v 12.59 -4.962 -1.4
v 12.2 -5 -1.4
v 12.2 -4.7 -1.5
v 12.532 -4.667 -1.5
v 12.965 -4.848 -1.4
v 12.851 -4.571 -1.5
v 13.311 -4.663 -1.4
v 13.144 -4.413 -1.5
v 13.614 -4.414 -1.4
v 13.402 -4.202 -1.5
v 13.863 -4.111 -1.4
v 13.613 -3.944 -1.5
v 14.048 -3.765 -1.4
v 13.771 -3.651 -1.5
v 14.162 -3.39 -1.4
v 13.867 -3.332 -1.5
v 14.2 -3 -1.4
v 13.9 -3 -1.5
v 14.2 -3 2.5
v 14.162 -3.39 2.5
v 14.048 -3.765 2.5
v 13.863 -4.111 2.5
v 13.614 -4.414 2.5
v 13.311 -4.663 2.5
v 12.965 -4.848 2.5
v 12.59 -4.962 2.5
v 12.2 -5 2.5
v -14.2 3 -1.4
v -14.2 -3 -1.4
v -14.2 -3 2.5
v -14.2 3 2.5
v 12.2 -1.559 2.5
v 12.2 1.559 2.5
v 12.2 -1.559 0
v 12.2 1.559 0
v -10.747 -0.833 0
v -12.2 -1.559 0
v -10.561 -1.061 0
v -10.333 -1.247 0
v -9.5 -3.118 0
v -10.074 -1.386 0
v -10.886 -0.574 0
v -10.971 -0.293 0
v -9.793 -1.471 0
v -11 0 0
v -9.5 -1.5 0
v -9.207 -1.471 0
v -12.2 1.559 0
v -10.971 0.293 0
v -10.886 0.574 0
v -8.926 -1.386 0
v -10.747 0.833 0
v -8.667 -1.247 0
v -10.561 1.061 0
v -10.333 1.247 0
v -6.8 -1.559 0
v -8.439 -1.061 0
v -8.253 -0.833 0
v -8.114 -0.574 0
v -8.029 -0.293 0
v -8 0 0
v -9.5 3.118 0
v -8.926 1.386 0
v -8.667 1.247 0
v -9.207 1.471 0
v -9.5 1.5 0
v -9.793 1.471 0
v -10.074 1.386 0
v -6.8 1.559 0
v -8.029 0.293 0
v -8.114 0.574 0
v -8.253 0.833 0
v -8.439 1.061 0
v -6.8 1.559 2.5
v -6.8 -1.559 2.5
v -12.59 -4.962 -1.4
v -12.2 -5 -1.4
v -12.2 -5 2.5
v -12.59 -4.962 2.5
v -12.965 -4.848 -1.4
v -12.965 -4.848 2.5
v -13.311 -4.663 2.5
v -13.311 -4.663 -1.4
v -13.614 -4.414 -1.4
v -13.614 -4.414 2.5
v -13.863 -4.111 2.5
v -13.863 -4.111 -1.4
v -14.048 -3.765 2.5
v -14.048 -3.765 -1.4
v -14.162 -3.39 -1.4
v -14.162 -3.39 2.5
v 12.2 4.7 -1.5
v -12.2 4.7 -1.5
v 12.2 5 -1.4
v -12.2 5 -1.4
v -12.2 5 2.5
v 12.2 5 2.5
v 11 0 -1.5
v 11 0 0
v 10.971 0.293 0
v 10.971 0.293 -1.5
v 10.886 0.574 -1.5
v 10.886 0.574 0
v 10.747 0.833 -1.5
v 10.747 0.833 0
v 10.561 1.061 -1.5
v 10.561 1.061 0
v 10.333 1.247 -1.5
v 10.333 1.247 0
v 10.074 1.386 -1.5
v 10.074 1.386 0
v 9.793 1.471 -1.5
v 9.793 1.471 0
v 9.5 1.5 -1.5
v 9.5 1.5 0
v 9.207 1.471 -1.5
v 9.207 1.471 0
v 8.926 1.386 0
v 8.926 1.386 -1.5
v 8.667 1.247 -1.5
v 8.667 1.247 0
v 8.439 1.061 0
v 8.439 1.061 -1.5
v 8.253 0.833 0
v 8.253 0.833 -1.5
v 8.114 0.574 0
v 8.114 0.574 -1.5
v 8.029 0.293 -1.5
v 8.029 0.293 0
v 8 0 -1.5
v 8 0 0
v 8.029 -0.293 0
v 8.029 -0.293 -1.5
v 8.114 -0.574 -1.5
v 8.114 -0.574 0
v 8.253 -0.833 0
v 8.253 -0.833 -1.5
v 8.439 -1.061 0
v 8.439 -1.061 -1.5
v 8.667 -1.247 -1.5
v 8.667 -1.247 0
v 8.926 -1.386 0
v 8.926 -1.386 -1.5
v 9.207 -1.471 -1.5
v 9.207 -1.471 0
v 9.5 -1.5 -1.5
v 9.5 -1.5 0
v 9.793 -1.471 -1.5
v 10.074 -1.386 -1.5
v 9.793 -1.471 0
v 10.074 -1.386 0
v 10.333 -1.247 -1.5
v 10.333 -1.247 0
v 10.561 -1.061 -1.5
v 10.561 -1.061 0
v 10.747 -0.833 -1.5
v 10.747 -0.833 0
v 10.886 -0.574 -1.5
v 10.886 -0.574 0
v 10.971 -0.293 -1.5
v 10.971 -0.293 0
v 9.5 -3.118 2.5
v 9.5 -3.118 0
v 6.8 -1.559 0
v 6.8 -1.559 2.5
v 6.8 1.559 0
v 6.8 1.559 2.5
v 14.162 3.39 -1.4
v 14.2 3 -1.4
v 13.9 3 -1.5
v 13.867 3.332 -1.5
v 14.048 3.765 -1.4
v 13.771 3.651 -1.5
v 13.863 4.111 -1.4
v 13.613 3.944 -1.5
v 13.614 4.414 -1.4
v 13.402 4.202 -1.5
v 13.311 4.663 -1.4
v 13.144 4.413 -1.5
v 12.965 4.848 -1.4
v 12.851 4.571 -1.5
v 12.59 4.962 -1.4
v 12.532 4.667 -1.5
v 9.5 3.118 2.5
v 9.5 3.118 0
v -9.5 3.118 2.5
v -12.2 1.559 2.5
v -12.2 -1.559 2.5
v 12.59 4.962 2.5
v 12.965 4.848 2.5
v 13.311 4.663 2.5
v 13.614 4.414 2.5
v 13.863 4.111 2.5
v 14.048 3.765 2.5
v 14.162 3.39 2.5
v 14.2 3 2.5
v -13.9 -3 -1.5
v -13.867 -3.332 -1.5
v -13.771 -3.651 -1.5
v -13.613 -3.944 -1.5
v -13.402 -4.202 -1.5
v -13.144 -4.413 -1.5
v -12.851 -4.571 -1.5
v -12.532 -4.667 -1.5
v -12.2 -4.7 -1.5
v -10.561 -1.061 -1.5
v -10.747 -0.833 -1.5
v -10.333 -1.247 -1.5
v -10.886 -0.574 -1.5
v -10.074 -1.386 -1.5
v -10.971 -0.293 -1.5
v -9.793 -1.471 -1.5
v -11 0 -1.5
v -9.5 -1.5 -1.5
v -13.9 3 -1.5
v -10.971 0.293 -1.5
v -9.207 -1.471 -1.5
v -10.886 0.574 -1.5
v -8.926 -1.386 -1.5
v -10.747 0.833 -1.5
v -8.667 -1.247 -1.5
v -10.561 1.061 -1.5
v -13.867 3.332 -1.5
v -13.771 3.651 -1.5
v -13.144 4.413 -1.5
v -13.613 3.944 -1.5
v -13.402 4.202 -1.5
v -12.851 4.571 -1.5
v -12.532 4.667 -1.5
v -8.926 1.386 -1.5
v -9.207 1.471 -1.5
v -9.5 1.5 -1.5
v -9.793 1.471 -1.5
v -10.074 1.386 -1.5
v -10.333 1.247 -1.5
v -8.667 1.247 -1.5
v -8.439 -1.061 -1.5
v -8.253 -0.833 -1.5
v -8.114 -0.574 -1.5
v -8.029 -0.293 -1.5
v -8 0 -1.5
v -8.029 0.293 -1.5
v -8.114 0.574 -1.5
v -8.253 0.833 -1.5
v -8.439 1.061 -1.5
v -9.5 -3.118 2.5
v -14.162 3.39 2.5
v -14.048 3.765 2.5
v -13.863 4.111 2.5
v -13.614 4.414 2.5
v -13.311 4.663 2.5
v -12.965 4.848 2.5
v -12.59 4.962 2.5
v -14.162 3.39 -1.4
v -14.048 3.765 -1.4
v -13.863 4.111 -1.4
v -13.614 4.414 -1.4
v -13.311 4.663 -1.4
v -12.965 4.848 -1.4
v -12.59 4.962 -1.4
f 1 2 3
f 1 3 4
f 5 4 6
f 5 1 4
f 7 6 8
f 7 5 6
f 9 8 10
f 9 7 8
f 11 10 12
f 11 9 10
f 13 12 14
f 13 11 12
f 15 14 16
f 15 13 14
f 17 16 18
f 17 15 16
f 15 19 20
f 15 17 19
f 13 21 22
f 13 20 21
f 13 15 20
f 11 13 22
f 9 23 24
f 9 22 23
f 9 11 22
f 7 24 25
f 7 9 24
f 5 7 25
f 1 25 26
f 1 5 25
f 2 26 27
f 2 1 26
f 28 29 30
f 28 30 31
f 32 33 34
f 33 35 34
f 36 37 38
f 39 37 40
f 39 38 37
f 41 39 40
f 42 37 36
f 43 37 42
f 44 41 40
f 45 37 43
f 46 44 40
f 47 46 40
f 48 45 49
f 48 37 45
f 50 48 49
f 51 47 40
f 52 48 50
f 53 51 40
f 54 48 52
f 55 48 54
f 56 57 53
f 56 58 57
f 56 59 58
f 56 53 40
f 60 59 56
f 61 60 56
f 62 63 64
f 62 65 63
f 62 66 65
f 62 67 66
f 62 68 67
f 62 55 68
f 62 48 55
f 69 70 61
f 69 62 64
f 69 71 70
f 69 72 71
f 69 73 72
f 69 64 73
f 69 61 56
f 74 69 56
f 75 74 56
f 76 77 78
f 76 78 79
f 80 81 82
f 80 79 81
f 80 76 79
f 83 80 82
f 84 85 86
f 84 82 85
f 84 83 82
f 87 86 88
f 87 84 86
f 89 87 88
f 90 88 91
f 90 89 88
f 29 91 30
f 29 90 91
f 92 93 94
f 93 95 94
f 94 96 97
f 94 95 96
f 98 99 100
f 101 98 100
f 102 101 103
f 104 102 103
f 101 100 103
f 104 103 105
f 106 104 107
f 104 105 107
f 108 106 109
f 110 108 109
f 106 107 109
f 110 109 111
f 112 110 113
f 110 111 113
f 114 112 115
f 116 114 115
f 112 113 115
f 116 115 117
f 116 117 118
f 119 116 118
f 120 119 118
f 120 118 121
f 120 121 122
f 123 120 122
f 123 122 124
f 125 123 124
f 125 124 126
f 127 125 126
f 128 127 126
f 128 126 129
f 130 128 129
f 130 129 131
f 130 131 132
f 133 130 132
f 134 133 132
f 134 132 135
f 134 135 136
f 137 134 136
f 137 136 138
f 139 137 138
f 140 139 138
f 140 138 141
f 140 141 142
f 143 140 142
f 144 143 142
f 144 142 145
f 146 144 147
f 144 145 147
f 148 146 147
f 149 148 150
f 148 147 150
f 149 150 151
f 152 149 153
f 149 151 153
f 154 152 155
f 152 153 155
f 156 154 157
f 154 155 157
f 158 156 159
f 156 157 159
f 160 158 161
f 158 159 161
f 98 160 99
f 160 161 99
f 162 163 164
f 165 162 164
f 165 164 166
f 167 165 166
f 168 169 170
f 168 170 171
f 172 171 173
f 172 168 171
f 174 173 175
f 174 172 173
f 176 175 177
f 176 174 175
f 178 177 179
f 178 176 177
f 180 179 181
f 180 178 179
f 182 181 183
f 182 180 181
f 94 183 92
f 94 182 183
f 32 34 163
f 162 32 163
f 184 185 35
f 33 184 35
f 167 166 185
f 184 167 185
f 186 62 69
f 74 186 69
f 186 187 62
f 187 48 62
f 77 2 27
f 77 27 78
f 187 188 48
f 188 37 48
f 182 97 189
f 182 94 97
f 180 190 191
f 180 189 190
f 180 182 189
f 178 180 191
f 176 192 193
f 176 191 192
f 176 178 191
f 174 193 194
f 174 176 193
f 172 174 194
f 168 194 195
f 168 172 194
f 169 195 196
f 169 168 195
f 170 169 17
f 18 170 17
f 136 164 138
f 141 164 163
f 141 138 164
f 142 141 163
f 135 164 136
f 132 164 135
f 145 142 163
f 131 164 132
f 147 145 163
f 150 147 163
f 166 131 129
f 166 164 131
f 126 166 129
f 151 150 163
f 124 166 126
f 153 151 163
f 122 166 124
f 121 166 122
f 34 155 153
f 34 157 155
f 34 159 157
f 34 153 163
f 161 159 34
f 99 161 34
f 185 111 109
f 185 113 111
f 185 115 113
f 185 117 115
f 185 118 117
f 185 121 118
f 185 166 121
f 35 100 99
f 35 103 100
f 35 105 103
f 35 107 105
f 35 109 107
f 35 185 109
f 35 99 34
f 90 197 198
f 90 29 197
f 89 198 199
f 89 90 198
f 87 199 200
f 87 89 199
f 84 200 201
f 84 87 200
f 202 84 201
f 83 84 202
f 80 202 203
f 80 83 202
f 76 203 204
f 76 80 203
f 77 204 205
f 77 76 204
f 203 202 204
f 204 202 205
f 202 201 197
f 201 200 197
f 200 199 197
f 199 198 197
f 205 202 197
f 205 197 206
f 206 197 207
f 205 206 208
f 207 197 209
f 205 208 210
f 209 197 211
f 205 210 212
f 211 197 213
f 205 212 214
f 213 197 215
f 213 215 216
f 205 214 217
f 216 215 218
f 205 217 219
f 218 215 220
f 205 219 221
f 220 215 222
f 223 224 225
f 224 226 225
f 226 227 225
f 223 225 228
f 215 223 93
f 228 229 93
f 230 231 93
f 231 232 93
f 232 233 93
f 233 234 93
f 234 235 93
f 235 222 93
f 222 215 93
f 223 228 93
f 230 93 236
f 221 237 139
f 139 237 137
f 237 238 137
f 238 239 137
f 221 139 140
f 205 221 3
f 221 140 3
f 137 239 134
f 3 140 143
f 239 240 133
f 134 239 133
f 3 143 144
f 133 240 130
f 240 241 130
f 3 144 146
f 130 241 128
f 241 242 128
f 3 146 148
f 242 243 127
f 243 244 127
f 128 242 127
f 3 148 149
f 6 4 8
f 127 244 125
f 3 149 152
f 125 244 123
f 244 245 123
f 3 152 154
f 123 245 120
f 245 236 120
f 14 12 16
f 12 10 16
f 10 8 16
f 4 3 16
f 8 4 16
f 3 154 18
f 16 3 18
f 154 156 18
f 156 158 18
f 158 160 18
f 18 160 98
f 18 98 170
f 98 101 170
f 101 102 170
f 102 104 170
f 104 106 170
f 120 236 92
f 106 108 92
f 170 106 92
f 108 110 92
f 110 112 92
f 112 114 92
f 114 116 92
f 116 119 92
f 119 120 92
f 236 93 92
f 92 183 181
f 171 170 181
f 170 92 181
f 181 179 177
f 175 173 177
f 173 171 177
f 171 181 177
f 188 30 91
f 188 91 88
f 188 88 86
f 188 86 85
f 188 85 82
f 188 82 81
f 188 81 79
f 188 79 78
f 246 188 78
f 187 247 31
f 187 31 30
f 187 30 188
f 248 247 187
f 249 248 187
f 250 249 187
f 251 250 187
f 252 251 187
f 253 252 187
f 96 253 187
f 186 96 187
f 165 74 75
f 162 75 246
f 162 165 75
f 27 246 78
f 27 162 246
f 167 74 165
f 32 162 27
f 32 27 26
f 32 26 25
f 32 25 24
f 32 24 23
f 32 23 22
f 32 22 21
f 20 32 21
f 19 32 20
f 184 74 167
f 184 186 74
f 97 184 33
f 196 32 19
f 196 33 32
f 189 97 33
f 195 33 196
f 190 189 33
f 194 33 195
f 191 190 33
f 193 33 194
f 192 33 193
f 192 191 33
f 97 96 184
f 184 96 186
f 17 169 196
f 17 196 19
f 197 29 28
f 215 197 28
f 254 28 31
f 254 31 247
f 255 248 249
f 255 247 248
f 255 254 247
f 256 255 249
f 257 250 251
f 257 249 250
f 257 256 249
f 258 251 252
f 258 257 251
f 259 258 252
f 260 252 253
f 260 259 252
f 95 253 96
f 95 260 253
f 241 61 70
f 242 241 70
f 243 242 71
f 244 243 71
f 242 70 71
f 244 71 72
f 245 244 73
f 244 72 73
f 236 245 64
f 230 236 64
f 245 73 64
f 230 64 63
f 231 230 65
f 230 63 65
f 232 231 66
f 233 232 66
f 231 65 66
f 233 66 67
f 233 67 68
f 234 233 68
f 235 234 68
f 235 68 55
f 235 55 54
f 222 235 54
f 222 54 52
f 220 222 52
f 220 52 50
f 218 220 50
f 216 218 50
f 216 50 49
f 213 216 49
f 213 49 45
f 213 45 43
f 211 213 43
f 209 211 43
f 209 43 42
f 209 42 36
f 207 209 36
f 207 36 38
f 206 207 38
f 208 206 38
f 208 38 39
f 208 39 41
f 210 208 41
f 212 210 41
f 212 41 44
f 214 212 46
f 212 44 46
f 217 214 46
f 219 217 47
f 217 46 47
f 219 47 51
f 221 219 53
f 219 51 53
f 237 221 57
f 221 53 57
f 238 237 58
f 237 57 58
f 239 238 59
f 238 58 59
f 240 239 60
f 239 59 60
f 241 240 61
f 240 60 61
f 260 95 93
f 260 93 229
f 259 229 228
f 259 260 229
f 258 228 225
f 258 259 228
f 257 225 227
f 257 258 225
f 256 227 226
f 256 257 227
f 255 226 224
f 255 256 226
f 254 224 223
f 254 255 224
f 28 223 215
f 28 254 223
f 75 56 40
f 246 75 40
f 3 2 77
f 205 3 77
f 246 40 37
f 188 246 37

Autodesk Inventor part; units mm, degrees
ref_plane "YZ Plane" through (0, 0, 0) normal (1, 0, 0) x (0, 1, 0)
ref_plane "XZ Plane" through (0, 0, 0) normal (0, 1, 0) x (-1, 0, 0)
ref_plane "XY Plane" through (0, 0, 0) normal (0, 0, 1) x (1, 0, 0)
sketch "Эскиз1" plane through (0, 0, 0) normal (0, 0, 1) x (1, 0, 0)
  line L0 (-6.8, -1.5588) -> (-9.5, -3.1177)
  line L1 (-9.5, -3.1177) -> (-12.2, -1.5588)
  circle A0 centre (-9.5, 0) radius 1.5
  line L2 (-6.8, 1.5588) -> (-6.8, -1.5588)
  line L3 (-12.2, -1.5588) -> (-12.2, 1.5588)
  line L4 (-9.5, 3.1177) -> (-6.8, 1.5588)
  line L5 (-12.2, 1.5588) -> (-9.5, 3.1177)
  line L6 (6.8, -1.5588) -> (6.8, 1.5588)
  line L7 (6.8, 1.5588) -> (9.5, 3.1177)
  line L8 (9.5, -3.1177) -> (6.8, -1.5588)
  circle A1 centre (9.5, 0) radius 1.5
  line L9 (9.5, 3.1177) -> (12.2, 1.5588)
  line L10 (12.2, 1.5588) -> (12.2, -1.5588)
  line L11 (12.2, -1.5588) -> (9.5, -3.1177)
  line L12 (-12.2, 5) -> (12.2, 5)
  line L13 (14.2, 3) -> (14.2, -3)
  line L14 (12.2, -5) -> (-12.2, -5)
  line L15 (-14.2, -3) -> (-14.2, 3)
  arc A2 (-12.2, 5) -> (-14.2, 3) centre (-12.2, 3) ccw
  arc A3 (-14.2, -3) -> (-12.2, -5) centre (-12.2, -3) ccw
  arc A4 (12.2, -5) -> (14.2, -3) centre (12.2, -3) ccw
  arc A5 (14.2, 3) -> (12.2, 5) centre (12.2, 3) ccw
  line L16 (0, 0) -> (0, 2.3671) construction
  point P0 (14.2, 0)
  point P1 (-14.2, 0)
  point P2 (0, 5)
  dimension "Width" = 10
  dimension "d6" = 2
  dimension "d12" = 13.6
extrude "Выдавливание1" add sketch "Эскиз1" against normal blind 1.5 contours L0 L1 L3 L5 L4 L2 | L6 L7 L9 L10 L11 L8 | L12 A5 L13 A4 L14 A3 L15 A2
extrude "Выдавливание2" add sketch "Эскиз1" along normal blind 2.5 contours L12 A5 L13 A4 L14 A3 L15 A2
chamfer "Фаска1" distance 0.3 distance2 0.1 8 edges at (0, 5, -1.5) (13.6142, 4.4142, -1.5) (14.2, 0, -1.5) (13.6142, -4.4142, -1.5) (0, -5, -1.5) (-13.6142, -4.4142, -1.5) (-14.2, 0, -1.5) (-13.6142, 4.4142, -1.5) measured on face at (2.8826, -3.7448, -1.5)
equation "\"d8\" = Thick - Nut_thick"
equation "\"Thick\" = 4"
equation "\"Nut_thick\" = 2.5"
properties part number "Крепежи динамиков"
